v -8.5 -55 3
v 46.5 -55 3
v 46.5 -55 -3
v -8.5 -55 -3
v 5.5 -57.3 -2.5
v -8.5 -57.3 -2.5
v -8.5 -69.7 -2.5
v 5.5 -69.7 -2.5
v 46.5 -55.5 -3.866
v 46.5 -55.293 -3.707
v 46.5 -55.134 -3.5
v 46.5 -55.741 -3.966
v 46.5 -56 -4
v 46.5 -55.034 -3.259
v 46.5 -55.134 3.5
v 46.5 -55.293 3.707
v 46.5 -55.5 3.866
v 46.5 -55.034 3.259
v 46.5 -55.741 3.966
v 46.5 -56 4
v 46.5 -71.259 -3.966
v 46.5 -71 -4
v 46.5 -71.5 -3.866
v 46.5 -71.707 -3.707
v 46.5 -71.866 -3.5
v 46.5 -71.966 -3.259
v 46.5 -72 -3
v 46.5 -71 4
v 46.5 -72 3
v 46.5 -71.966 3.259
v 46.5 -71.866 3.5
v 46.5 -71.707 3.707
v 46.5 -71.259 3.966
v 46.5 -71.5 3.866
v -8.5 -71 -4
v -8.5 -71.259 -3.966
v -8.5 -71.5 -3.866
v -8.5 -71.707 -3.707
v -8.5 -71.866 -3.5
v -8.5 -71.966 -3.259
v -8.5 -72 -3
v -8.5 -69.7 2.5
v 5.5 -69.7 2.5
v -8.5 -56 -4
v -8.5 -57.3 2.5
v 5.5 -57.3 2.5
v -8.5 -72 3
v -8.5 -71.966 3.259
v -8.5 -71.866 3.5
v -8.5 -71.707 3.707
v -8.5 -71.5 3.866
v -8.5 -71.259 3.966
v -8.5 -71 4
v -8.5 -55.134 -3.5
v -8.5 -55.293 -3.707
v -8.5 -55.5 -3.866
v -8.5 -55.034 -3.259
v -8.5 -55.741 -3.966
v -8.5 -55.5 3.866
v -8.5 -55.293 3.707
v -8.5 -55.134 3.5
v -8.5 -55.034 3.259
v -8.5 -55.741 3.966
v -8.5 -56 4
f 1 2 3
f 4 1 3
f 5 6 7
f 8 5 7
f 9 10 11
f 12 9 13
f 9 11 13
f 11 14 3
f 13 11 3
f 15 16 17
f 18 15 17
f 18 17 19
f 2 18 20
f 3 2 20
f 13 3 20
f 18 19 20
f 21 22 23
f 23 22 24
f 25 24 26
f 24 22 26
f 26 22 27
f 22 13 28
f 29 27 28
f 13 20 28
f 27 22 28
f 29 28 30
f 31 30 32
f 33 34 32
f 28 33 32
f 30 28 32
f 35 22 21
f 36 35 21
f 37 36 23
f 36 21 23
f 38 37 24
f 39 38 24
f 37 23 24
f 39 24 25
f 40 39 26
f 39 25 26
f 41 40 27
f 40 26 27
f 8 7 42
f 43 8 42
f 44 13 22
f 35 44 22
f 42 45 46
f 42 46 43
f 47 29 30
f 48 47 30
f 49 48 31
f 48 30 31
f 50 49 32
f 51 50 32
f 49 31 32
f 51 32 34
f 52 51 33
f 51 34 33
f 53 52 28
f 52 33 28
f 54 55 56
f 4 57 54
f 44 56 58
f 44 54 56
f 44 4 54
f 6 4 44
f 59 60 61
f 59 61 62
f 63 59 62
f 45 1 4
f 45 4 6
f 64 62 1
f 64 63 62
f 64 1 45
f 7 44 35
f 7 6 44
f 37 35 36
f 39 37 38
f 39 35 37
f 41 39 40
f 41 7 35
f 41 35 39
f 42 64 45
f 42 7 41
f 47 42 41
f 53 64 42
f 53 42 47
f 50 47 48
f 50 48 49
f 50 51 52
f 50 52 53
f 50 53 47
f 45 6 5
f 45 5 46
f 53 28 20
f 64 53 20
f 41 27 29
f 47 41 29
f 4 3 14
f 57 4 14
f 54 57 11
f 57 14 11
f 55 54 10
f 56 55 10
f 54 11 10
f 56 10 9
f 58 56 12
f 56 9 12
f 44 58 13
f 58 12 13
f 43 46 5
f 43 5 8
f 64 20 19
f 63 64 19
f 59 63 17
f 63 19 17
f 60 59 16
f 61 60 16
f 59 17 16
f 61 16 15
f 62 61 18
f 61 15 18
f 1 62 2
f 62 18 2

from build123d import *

# Parameters (mm, degrees)
F2_DEPTH = 55
F3_W     = 12.4
F3_H     = 5
F4_DEPTH = 14
F6_ANGLE = 90


with BuildPart() as f2:
    # F1 (on face) → F2 (new body)
    with BuildSketch(Plane.XZ):
        with BuildLine():
            Line((7.5, 4), (-7.5, 4))
            ThreePointArc((-7.5, 4), (-8.2071067812, 3.7071067812), (-8.5, 3))
            Line((-8.5, 3), (-8.5, -3))
            ThreePointArc((-8.5, -3), (-8.2071067812, -3.7071067812), (-7.5, -4))
            Line((-7.5, -4), (7.5, -4))
            ThreePointArc((7.5, -4), (8.2071067812, -3.7071067812), (8.5, -3))
            Line((8.5, -3), (8.5, 3))
            ThreePointArc((8.5, 3), (8.2071067812, 3.7071067812), (7.5, 4))
        make_face()
    extrude(amount=F2_DEPTH)

    # F3 (on face) → F4 (cut)
    with BuildSketch(Plane.XZ.offset(55)):
        Rectangle(F3_W, F3_H)
    extrude(amount=-F4_DEPTH, mode=Mode.SUBTRACT)


with BuildPart() as f2_1:
    # F6: moved
    add(f2.part.rotate(Axis((-8.5, -55, 0), (0, 0, -1)), F6_ANGLE))


solid = f2_1.part
